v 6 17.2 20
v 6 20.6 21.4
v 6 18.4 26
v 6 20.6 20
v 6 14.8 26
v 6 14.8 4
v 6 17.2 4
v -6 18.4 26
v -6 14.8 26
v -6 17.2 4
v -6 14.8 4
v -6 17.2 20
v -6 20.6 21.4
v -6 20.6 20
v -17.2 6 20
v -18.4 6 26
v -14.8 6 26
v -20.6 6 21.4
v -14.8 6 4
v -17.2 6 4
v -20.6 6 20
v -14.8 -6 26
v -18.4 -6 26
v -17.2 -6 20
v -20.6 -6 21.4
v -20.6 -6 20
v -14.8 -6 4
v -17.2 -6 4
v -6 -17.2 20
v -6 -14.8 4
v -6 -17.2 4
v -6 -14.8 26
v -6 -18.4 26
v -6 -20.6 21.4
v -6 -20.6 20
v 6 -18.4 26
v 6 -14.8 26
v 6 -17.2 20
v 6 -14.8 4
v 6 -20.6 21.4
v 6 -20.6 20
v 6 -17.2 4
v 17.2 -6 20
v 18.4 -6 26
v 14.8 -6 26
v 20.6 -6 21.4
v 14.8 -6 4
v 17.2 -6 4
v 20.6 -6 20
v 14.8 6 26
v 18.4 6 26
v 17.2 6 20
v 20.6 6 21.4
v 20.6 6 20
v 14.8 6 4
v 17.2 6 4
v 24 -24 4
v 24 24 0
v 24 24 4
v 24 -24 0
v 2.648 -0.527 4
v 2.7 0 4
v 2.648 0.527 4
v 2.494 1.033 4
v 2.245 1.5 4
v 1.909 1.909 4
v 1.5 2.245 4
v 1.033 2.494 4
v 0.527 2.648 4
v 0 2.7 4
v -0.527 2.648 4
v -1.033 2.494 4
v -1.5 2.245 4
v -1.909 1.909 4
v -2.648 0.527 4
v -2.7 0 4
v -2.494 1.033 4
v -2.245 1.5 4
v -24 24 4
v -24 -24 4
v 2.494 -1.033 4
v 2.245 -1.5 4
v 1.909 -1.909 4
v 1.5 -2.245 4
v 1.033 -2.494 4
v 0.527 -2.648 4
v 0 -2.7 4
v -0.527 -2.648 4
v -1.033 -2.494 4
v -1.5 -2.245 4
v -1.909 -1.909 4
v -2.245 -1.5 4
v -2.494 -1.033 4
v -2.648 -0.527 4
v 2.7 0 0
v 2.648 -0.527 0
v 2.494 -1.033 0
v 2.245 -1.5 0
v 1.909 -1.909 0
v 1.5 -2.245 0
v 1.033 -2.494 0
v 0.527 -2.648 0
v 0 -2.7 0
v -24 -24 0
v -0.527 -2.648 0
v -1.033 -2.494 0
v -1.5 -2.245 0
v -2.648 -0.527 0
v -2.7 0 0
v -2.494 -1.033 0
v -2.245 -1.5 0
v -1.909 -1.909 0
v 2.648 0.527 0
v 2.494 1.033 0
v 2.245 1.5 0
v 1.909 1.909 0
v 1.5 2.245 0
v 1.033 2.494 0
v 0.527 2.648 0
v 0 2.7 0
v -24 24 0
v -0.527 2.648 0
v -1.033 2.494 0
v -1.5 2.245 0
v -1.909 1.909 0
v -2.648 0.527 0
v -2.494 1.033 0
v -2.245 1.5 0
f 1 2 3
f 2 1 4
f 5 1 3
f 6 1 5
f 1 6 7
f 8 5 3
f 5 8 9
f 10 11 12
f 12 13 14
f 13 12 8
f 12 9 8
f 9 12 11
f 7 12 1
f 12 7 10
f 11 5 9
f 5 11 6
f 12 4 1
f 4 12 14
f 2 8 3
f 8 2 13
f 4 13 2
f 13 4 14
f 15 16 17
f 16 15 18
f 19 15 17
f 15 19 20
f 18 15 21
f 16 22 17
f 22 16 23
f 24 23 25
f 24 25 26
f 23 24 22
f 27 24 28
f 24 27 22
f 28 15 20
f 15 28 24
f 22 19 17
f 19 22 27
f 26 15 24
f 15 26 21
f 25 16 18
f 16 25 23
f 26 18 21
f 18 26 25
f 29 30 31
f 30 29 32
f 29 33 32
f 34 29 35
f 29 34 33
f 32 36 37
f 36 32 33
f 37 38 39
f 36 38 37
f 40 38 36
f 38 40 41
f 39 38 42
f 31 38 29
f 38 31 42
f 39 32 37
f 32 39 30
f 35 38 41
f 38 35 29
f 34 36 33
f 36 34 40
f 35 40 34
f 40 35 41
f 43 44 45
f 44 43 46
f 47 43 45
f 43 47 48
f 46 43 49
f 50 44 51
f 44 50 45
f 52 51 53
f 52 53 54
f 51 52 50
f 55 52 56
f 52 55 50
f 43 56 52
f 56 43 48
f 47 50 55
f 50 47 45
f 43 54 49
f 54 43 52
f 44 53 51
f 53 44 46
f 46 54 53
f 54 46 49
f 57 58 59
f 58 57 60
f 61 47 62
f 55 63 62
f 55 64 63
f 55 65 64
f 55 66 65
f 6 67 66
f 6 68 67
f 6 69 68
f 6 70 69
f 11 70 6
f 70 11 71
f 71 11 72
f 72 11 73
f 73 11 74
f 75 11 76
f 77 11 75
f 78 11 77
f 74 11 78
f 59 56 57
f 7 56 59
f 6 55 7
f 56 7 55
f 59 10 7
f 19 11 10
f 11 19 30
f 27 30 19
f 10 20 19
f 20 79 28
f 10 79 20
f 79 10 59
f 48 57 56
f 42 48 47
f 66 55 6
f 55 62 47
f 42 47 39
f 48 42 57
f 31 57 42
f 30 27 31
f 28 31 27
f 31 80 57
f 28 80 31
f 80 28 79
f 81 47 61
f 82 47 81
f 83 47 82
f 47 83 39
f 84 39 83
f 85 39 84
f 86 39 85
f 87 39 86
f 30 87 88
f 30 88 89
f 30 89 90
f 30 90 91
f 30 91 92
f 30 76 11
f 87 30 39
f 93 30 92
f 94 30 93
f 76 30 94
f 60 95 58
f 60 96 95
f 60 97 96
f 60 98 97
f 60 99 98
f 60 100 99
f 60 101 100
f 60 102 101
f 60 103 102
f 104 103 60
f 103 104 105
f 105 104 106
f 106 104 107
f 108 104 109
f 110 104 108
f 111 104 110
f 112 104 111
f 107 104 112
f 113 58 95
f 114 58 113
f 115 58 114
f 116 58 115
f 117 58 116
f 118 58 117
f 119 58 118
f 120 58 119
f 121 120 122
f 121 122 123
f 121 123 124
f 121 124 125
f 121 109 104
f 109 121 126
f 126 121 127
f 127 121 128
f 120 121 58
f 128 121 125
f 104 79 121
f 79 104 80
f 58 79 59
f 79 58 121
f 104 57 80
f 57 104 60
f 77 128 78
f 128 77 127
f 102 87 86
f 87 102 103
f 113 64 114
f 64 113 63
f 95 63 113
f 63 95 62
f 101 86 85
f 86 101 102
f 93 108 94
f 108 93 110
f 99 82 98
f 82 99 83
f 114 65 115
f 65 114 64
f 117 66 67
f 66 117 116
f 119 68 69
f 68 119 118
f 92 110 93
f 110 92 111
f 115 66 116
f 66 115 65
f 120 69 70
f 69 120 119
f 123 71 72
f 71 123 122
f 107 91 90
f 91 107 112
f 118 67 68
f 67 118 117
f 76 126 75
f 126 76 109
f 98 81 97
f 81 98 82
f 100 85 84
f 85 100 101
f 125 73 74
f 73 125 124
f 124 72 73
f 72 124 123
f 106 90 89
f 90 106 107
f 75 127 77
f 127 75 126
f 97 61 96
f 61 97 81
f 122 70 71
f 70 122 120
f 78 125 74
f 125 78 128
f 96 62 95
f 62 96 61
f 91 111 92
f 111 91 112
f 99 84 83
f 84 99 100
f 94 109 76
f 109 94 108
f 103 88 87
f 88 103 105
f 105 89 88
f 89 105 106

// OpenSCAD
$fn = 32;

// ----------------------------------------------------------------------
// Snap-fit latch: 4 arms, 22 mm tall, 3.6 mm undercut hooks
// ----------------------------------------------------------------------

// --- parameters (mm) ---
base_d = 48;              // base plate depth
base_h = 4;               // base plate thickness
span = 32;                // distance between opposite arms
arm_t = 2.4;              // arm thickness
arm_d = 12;               // arm width
height = 22;              // free arm length
head_len = 3.6;           // hook reach
head_h = 6;               // hook height
lead = 1.4;               // lead-in ramp thickness
bore_d = 5.4;             // base fixing bore
top_z = 26;               // height of the arm tips above the base

arms = 4;

difference() {
  union() {
    /* base plate, centred on the arm ring */
    translate([-24, -24, 0]) cube([base_d, base_d, base_h]);
    for (a = [0 : 360 / arms : 359]) rotate([0, 0, a]) {
    /* arm, sunk 0.5 mm into the base */
    translate([-arm_d / 2, span / 2 - arm_t / 2, base_h - 0.5]) cube([arm_d, arm_t, height + 0.5]);
    /* hook: a convex hull of a tall inner block and a thin outer lip
       gives a flat undercut below and a lead-in ramp on top */
    hull() {
      translate([-arm_d / 2, span / 2 + arm_t / 2 - 0.6, top_z - head_h]) cube([arm_d, lead + 0.4, head_h]);
      translate([-arm_d / 2, span / 2 + arm_t / 2 - 0.2, top_z - head_h]) cube([arm_d, head_len, lead]);
    }
    }
  }
  translate([0, 0, -2.5]) cylinder(h = base_h + 5, d = bore_d);
}
